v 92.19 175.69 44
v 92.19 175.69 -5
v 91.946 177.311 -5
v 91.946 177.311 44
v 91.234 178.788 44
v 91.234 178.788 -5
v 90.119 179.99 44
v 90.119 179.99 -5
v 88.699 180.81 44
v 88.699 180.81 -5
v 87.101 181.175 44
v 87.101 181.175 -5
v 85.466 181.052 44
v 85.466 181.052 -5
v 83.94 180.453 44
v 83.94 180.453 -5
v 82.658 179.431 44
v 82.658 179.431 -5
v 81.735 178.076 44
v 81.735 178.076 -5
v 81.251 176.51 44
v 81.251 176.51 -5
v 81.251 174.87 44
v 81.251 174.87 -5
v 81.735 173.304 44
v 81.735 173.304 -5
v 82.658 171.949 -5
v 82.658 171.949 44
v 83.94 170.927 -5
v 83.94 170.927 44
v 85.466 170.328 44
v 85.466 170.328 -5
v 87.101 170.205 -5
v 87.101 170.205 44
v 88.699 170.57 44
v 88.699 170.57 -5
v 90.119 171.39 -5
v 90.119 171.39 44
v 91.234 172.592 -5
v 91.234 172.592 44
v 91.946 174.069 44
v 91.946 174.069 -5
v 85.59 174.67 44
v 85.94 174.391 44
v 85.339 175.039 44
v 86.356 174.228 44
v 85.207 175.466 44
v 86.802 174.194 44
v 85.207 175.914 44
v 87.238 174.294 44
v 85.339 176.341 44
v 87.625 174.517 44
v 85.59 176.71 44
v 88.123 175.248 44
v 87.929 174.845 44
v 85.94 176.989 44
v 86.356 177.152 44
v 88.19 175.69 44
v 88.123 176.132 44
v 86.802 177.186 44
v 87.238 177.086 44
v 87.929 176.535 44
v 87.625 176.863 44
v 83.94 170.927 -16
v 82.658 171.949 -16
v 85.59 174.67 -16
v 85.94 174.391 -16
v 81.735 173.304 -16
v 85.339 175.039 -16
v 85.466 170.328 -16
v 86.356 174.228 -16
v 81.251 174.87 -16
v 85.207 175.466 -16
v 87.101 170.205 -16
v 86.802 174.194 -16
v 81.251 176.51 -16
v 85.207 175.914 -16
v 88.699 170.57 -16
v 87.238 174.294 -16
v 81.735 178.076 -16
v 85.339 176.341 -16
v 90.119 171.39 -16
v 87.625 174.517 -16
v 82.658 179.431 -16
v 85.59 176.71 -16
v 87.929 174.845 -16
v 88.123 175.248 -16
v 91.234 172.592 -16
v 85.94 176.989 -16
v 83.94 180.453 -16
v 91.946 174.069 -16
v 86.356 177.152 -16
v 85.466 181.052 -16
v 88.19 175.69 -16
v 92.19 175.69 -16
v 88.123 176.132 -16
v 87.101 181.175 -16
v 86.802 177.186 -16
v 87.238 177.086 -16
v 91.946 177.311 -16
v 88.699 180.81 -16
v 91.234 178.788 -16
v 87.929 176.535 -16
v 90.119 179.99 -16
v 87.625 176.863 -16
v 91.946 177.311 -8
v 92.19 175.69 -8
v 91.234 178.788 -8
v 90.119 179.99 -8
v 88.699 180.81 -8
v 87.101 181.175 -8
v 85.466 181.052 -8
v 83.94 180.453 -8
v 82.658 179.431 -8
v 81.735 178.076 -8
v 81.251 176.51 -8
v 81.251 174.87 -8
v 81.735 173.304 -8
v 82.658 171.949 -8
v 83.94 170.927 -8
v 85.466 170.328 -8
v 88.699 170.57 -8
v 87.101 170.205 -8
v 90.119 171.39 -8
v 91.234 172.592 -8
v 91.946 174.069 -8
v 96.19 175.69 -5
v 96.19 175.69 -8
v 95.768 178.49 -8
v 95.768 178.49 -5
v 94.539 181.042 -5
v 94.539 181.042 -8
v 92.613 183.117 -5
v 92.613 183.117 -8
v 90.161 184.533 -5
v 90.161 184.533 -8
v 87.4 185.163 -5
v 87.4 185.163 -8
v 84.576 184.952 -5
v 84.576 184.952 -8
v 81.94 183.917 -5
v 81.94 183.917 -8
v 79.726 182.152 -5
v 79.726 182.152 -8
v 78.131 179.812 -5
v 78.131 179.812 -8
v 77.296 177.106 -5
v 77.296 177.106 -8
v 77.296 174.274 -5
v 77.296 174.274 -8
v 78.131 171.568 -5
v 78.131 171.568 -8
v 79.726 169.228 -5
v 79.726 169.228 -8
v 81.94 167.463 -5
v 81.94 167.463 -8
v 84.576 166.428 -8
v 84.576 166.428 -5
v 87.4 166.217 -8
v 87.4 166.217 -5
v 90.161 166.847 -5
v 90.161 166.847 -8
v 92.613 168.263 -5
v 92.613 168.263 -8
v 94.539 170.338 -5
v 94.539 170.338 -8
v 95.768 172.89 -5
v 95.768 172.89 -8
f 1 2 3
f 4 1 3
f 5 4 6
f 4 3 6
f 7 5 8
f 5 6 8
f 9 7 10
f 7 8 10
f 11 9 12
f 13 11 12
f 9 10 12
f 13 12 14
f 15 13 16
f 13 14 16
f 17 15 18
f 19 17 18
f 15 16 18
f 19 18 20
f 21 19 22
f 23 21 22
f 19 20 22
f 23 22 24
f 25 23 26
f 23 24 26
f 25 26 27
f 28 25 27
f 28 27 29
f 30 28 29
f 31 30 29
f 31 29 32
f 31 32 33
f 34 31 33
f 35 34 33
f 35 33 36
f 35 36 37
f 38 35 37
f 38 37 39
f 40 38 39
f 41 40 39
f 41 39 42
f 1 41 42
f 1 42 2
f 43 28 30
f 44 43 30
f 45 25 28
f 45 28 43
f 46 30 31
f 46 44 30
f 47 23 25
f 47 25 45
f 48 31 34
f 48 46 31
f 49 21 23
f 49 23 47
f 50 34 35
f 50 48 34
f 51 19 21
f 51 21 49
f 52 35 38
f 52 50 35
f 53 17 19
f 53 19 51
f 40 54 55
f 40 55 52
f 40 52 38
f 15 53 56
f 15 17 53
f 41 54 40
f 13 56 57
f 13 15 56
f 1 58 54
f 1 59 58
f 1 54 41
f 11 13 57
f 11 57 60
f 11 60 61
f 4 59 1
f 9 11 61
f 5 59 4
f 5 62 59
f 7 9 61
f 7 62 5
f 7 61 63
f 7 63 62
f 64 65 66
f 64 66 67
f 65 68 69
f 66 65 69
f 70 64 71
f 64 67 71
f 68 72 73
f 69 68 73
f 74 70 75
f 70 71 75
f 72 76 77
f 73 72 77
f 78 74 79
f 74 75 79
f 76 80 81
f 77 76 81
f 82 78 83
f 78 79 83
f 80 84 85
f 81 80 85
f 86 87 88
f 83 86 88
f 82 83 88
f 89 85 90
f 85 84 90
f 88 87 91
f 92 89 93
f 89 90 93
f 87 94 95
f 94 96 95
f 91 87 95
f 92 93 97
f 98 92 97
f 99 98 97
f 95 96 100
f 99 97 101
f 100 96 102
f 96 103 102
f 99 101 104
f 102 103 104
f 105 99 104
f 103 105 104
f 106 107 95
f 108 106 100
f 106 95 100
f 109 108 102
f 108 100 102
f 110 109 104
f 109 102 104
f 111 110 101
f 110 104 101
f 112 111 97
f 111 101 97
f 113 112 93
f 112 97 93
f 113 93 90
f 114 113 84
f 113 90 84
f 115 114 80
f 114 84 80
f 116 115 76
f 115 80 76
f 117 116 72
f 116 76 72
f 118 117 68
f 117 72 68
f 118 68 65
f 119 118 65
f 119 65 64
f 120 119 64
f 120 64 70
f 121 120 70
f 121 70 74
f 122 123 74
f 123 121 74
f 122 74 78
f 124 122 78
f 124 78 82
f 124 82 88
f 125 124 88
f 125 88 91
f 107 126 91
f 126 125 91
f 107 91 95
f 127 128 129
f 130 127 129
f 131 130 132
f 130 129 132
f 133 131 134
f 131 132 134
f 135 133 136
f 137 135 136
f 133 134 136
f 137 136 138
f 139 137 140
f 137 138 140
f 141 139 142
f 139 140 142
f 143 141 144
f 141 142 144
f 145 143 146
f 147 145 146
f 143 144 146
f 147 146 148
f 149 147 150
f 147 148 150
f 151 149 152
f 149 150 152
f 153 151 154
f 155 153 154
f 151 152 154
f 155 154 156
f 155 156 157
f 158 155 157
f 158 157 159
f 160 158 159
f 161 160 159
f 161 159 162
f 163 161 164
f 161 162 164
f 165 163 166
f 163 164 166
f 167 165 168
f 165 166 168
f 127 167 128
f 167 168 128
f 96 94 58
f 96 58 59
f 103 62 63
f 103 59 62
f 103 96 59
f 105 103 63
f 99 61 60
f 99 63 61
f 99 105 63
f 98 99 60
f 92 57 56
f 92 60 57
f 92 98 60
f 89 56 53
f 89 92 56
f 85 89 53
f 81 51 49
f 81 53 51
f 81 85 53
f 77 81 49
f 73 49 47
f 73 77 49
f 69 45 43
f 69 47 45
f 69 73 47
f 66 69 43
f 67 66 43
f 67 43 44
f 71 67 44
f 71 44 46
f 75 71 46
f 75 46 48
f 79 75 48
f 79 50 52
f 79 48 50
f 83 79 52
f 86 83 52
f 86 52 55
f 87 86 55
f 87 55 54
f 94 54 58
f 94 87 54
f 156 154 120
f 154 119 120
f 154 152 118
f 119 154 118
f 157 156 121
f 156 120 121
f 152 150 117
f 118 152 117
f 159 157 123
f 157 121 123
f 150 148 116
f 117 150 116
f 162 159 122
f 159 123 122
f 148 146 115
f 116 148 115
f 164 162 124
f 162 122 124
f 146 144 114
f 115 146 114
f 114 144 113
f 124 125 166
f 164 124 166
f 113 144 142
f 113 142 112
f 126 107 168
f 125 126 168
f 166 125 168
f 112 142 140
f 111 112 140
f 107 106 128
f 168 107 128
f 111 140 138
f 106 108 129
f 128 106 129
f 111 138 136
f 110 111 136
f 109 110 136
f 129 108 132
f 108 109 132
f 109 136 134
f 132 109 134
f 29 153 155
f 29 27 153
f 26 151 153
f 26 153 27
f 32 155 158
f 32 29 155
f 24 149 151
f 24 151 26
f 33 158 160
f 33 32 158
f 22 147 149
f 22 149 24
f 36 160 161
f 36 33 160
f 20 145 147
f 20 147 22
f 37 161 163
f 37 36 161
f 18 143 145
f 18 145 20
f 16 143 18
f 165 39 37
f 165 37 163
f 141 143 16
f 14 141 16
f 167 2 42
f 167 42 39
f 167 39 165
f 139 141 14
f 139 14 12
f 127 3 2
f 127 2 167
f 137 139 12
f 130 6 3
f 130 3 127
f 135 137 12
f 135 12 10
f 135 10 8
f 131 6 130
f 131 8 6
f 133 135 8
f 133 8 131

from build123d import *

# Parameters (mm, degrees)
CYLINDER106_R     = 1.5
CYLINDER106_DEPTH = 108
CYLINDER105_R     = 5.5
CYLINDER105_DEPTH = 60
CYLINDER108_R     = 9.5
CYLINDER108_DEPTH = 3


with BuildPart() as rfcoolinghole:
    # Cylinder106 → Cylinder106 (new body)
    with BuildSketch(Plane(origin=(86.69, 175.69, -20), x_dir=(1, 0, 0), z_dir=(0, 0, 1))):
        Circle(CYLINDER106_R)
    extrude(amount=CYLINDER106_DEPTH)


with BuildPart() as rfftrod1:
    # Cylinder105 → Cylinder105 (new body)
    with BuildSketch(Plane(origin=(86.69, 175.69, -16), x_dir=(1, 0, 0), z_dir=(0, 0, 1))):
        Circle(CYLINDER105_R)
    extrude(amount=CYLINDER105_DEPTH)


with BuildPart() as rffeed1:
    # Cylinder108 → Cylinder108 (new body)
    with BuildSketch(Plane(origin=(86.69, 175.69, -8), x_dir=(1, 0, 0), z_dir=(0, 0, 1))):
        Circle(CYLINDER108_R)
    extrude(amount=CYLINDER108_DEPTH)

    # Fusion044: union RFFTrod1
    add(rfftrod1.part)

    # Cut012: cut RFcoolingHole
    add(rfcoolinghole.part, mode=Mode.SUBTRACT)


solid = rffeed1.part
